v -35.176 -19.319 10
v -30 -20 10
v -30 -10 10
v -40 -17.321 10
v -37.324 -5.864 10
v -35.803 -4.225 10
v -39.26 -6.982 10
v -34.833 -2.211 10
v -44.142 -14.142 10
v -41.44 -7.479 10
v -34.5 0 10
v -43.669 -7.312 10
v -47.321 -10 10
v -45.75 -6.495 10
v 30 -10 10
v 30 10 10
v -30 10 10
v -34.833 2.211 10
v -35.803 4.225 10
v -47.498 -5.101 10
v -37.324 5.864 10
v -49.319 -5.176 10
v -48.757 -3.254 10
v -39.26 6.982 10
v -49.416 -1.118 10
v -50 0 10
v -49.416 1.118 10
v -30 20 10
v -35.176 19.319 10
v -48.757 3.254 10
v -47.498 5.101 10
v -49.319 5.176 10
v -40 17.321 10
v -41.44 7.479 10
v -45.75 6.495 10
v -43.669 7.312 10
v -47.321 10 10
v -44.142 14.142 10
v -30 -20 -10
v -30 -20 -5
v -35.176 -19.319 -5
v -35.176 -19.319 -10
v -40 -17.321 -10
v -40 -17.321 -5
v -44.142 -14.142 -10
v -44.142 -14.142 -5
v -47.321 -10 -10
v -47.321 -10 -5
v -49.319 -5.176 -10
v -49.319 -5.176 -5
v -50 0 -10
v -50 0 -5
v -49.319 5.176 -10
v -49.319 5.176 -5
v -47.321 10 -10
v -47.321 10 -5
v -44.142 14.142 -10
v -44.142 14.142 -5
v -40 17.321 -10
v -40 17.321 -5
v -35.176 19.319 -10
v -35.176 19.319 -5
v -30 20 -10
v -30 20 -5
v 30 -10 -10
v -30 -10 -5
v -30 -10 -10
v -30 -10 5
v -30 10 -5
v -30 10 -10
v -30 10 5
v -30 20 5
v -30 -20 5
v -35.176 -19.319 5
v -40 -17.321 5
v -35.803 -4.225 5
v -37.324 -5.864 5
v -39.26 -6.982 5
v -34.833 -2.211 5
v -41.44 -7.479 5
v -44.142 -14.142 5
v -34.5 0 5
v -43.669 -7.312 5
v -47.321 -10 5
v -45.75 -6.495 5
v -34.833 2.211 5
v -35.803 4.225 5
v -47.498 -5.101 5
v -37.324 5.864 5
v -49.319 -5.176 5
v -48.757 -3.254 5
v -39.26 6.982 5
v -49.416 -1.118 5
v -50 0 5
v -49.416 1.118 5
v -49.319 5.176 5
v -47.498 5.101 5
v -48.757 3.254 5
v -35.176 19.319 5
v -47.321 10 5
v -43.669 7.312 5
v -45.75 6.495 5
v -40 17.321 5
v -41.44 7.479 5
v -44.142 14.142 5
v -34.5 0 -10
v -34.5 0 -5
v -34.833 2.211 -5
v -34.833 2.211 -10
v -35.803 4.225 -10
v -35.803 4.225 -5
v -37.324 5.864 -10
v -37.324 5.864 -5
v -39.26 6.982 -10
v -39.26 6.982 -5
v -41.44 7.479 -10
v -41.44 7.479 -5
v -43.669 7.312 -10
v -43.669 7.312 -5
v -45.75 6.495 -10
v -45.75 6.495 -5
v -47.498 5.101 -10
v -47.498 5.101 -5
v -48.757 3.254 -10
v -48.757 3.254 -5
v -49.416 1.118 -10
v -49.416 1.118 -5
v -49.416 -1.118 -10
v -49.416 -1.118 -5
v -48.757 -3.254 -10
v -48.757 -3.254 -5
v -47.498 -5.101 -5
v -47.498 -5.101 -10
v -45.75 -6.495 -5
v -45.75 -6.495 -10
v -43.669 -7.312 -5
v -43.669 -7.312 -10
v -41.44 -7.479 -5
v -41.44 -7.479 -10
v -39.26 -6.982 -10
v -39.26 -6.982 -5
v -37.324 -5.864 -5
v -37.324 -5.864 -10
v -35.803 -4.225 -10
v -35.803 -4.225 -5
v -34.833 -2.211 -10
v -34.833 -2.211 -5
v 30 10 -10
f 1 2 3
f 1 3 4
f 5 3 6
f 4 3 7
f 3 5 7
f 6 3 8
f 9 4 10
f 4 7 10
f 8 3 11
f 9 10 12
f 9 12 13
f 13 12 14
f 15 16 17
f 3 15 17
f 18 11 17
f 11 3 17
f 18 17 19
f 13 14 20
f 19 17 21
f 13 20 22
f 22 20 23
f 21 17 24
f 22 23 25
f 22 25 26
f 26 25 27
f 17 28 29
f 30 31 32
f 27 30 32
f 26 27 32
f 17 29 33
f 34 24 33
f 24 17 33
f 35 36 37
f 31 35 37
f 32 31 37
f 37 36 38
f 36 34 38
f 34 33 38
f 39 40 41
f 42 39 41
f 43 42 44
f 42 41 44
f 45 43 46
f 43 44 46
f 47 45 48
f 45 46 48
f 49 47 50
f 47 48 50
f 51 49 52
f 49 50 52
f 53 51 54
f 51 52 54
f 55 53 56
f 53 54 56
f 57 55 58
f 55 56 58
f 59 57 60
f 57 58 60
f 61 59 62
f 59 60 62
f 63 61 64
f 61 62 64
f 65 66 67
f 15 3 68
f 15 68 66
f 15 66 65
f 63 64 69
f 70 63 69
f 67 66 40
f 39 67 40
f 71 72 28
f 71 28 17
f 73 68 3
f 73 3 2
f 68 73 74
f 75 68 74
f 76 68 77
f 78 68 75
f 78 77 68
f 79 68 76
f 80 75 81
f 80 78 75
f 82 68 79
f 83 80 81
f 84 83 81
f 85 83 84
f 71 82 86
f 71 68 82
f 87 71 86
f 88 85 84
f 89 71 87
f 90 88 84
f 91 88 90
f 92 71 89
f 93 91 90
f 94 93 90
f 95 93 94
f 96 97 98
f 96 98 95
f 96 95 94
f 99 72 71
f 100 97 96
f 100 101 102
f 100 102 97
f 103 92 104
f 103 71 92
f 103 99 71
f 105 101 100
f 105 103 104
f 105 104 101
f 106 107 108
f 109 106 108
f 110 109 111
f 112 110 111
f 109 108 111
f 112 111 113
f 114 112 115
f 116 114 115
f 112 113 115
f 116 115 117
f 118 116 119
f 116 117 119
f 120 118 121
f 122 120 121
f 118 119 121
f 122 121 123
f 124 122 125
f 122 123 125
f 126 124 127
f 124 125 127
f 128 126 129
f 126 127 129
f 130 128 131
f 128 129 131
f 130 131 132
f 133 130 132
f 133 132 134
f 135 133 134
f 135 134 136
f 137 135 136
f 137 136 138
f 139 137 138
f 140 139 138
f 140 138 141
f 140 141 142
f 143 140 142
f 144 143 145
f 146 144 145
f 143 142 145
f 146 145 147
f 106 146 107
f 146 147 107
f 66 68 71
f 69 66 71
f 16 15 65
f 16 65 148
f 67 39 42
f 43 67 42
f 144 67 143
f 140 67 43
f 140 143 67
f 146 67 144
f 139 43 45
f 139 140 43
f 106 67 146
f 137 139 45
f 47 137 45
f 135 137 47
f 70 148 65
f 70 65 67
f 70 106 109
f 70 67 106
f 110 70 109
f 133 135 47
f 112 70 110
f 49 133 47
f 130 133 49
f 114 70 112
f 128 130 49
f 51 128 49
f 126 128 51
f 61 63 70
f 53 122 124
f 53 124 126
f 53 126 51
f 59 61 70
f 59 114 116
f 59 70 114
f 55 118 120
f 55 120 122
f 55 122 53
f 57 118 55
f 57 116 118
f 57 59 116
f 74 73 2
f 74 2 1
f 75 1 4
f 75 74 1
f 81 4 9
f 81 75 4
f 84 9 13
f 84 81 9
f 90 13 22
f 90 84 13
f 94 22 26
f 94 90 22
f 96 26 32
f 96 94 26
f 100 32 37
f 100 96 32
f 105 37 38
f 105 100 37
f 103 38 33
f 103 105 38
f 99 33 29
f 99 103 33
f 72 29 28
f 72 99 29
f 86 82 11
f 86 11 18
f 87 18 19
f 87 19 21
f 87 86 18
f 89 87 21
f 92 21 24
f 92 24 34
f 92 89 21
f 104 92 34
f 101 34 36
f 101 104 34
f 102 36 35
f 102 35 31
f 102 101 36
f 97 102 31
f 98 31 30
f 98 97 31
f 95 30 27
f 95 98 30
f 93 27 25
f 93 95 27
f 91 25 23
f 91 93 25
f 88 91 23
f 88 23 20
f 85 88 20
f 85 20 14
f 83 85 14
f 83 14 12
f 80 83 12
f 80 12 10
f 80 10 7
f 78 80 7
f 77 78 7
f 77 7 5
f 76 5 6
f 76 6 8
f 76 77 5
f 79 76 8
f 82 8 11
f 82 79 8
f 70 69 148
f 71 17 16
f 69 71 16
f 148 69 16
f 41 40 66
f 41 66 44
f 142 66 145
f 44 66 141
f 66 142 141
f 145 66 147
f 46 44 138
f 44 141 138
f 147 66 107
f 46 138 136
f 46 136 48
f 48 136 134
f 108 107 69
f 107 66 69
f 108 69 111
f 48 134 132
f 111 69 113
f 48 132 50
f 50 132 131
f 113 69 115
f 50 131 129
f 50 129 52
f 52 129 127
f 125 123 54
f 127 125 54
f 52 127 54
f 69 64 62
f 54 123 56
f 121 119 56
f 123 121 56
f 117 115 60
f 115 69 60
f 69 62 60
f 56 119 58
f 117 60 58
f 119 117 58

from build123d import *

# Parameters (mm, degrees)
SKETCH_1_W      = 60
SKETCH_1_H      = 20
EXTRUDE_1_DEPTH = 10
SKETCH_2_R      = 7.5
EXTRUDE_2_DEPTH = 5


with BuildPart() as part:
    # 草图1 → 凸台-拉伸1 (new, symmetric)
    with BuildSketch(Plane.XY):
        Rectangle(SKETCH_1_W, SKETCH_1_H)
    extrude(amount=EXTRUDE_1_DEPTH, both=True)

    # 草图2 → 凸台-拉伸2 (add)
    with BuildSketch(Plane.XY.offset(-5)):
        with BuildLine():
            Line((-30, 20), (-30, -20))
            ThreePointArc((-30, -20), (-50, 0), (-30, 20))
        make_face()
        with Locations((-42, 0)):
            Circle(SKETCH_2_R, mode=Mode.SUBTRACT)
    extrude_2 = extrude(amount=-EXTRUDE_2_DEPTH)

    # 镜向4: 凸台-拉伸2 across plane
    add(extrude_2.mirror(Plane.XY))


solid = part.part
